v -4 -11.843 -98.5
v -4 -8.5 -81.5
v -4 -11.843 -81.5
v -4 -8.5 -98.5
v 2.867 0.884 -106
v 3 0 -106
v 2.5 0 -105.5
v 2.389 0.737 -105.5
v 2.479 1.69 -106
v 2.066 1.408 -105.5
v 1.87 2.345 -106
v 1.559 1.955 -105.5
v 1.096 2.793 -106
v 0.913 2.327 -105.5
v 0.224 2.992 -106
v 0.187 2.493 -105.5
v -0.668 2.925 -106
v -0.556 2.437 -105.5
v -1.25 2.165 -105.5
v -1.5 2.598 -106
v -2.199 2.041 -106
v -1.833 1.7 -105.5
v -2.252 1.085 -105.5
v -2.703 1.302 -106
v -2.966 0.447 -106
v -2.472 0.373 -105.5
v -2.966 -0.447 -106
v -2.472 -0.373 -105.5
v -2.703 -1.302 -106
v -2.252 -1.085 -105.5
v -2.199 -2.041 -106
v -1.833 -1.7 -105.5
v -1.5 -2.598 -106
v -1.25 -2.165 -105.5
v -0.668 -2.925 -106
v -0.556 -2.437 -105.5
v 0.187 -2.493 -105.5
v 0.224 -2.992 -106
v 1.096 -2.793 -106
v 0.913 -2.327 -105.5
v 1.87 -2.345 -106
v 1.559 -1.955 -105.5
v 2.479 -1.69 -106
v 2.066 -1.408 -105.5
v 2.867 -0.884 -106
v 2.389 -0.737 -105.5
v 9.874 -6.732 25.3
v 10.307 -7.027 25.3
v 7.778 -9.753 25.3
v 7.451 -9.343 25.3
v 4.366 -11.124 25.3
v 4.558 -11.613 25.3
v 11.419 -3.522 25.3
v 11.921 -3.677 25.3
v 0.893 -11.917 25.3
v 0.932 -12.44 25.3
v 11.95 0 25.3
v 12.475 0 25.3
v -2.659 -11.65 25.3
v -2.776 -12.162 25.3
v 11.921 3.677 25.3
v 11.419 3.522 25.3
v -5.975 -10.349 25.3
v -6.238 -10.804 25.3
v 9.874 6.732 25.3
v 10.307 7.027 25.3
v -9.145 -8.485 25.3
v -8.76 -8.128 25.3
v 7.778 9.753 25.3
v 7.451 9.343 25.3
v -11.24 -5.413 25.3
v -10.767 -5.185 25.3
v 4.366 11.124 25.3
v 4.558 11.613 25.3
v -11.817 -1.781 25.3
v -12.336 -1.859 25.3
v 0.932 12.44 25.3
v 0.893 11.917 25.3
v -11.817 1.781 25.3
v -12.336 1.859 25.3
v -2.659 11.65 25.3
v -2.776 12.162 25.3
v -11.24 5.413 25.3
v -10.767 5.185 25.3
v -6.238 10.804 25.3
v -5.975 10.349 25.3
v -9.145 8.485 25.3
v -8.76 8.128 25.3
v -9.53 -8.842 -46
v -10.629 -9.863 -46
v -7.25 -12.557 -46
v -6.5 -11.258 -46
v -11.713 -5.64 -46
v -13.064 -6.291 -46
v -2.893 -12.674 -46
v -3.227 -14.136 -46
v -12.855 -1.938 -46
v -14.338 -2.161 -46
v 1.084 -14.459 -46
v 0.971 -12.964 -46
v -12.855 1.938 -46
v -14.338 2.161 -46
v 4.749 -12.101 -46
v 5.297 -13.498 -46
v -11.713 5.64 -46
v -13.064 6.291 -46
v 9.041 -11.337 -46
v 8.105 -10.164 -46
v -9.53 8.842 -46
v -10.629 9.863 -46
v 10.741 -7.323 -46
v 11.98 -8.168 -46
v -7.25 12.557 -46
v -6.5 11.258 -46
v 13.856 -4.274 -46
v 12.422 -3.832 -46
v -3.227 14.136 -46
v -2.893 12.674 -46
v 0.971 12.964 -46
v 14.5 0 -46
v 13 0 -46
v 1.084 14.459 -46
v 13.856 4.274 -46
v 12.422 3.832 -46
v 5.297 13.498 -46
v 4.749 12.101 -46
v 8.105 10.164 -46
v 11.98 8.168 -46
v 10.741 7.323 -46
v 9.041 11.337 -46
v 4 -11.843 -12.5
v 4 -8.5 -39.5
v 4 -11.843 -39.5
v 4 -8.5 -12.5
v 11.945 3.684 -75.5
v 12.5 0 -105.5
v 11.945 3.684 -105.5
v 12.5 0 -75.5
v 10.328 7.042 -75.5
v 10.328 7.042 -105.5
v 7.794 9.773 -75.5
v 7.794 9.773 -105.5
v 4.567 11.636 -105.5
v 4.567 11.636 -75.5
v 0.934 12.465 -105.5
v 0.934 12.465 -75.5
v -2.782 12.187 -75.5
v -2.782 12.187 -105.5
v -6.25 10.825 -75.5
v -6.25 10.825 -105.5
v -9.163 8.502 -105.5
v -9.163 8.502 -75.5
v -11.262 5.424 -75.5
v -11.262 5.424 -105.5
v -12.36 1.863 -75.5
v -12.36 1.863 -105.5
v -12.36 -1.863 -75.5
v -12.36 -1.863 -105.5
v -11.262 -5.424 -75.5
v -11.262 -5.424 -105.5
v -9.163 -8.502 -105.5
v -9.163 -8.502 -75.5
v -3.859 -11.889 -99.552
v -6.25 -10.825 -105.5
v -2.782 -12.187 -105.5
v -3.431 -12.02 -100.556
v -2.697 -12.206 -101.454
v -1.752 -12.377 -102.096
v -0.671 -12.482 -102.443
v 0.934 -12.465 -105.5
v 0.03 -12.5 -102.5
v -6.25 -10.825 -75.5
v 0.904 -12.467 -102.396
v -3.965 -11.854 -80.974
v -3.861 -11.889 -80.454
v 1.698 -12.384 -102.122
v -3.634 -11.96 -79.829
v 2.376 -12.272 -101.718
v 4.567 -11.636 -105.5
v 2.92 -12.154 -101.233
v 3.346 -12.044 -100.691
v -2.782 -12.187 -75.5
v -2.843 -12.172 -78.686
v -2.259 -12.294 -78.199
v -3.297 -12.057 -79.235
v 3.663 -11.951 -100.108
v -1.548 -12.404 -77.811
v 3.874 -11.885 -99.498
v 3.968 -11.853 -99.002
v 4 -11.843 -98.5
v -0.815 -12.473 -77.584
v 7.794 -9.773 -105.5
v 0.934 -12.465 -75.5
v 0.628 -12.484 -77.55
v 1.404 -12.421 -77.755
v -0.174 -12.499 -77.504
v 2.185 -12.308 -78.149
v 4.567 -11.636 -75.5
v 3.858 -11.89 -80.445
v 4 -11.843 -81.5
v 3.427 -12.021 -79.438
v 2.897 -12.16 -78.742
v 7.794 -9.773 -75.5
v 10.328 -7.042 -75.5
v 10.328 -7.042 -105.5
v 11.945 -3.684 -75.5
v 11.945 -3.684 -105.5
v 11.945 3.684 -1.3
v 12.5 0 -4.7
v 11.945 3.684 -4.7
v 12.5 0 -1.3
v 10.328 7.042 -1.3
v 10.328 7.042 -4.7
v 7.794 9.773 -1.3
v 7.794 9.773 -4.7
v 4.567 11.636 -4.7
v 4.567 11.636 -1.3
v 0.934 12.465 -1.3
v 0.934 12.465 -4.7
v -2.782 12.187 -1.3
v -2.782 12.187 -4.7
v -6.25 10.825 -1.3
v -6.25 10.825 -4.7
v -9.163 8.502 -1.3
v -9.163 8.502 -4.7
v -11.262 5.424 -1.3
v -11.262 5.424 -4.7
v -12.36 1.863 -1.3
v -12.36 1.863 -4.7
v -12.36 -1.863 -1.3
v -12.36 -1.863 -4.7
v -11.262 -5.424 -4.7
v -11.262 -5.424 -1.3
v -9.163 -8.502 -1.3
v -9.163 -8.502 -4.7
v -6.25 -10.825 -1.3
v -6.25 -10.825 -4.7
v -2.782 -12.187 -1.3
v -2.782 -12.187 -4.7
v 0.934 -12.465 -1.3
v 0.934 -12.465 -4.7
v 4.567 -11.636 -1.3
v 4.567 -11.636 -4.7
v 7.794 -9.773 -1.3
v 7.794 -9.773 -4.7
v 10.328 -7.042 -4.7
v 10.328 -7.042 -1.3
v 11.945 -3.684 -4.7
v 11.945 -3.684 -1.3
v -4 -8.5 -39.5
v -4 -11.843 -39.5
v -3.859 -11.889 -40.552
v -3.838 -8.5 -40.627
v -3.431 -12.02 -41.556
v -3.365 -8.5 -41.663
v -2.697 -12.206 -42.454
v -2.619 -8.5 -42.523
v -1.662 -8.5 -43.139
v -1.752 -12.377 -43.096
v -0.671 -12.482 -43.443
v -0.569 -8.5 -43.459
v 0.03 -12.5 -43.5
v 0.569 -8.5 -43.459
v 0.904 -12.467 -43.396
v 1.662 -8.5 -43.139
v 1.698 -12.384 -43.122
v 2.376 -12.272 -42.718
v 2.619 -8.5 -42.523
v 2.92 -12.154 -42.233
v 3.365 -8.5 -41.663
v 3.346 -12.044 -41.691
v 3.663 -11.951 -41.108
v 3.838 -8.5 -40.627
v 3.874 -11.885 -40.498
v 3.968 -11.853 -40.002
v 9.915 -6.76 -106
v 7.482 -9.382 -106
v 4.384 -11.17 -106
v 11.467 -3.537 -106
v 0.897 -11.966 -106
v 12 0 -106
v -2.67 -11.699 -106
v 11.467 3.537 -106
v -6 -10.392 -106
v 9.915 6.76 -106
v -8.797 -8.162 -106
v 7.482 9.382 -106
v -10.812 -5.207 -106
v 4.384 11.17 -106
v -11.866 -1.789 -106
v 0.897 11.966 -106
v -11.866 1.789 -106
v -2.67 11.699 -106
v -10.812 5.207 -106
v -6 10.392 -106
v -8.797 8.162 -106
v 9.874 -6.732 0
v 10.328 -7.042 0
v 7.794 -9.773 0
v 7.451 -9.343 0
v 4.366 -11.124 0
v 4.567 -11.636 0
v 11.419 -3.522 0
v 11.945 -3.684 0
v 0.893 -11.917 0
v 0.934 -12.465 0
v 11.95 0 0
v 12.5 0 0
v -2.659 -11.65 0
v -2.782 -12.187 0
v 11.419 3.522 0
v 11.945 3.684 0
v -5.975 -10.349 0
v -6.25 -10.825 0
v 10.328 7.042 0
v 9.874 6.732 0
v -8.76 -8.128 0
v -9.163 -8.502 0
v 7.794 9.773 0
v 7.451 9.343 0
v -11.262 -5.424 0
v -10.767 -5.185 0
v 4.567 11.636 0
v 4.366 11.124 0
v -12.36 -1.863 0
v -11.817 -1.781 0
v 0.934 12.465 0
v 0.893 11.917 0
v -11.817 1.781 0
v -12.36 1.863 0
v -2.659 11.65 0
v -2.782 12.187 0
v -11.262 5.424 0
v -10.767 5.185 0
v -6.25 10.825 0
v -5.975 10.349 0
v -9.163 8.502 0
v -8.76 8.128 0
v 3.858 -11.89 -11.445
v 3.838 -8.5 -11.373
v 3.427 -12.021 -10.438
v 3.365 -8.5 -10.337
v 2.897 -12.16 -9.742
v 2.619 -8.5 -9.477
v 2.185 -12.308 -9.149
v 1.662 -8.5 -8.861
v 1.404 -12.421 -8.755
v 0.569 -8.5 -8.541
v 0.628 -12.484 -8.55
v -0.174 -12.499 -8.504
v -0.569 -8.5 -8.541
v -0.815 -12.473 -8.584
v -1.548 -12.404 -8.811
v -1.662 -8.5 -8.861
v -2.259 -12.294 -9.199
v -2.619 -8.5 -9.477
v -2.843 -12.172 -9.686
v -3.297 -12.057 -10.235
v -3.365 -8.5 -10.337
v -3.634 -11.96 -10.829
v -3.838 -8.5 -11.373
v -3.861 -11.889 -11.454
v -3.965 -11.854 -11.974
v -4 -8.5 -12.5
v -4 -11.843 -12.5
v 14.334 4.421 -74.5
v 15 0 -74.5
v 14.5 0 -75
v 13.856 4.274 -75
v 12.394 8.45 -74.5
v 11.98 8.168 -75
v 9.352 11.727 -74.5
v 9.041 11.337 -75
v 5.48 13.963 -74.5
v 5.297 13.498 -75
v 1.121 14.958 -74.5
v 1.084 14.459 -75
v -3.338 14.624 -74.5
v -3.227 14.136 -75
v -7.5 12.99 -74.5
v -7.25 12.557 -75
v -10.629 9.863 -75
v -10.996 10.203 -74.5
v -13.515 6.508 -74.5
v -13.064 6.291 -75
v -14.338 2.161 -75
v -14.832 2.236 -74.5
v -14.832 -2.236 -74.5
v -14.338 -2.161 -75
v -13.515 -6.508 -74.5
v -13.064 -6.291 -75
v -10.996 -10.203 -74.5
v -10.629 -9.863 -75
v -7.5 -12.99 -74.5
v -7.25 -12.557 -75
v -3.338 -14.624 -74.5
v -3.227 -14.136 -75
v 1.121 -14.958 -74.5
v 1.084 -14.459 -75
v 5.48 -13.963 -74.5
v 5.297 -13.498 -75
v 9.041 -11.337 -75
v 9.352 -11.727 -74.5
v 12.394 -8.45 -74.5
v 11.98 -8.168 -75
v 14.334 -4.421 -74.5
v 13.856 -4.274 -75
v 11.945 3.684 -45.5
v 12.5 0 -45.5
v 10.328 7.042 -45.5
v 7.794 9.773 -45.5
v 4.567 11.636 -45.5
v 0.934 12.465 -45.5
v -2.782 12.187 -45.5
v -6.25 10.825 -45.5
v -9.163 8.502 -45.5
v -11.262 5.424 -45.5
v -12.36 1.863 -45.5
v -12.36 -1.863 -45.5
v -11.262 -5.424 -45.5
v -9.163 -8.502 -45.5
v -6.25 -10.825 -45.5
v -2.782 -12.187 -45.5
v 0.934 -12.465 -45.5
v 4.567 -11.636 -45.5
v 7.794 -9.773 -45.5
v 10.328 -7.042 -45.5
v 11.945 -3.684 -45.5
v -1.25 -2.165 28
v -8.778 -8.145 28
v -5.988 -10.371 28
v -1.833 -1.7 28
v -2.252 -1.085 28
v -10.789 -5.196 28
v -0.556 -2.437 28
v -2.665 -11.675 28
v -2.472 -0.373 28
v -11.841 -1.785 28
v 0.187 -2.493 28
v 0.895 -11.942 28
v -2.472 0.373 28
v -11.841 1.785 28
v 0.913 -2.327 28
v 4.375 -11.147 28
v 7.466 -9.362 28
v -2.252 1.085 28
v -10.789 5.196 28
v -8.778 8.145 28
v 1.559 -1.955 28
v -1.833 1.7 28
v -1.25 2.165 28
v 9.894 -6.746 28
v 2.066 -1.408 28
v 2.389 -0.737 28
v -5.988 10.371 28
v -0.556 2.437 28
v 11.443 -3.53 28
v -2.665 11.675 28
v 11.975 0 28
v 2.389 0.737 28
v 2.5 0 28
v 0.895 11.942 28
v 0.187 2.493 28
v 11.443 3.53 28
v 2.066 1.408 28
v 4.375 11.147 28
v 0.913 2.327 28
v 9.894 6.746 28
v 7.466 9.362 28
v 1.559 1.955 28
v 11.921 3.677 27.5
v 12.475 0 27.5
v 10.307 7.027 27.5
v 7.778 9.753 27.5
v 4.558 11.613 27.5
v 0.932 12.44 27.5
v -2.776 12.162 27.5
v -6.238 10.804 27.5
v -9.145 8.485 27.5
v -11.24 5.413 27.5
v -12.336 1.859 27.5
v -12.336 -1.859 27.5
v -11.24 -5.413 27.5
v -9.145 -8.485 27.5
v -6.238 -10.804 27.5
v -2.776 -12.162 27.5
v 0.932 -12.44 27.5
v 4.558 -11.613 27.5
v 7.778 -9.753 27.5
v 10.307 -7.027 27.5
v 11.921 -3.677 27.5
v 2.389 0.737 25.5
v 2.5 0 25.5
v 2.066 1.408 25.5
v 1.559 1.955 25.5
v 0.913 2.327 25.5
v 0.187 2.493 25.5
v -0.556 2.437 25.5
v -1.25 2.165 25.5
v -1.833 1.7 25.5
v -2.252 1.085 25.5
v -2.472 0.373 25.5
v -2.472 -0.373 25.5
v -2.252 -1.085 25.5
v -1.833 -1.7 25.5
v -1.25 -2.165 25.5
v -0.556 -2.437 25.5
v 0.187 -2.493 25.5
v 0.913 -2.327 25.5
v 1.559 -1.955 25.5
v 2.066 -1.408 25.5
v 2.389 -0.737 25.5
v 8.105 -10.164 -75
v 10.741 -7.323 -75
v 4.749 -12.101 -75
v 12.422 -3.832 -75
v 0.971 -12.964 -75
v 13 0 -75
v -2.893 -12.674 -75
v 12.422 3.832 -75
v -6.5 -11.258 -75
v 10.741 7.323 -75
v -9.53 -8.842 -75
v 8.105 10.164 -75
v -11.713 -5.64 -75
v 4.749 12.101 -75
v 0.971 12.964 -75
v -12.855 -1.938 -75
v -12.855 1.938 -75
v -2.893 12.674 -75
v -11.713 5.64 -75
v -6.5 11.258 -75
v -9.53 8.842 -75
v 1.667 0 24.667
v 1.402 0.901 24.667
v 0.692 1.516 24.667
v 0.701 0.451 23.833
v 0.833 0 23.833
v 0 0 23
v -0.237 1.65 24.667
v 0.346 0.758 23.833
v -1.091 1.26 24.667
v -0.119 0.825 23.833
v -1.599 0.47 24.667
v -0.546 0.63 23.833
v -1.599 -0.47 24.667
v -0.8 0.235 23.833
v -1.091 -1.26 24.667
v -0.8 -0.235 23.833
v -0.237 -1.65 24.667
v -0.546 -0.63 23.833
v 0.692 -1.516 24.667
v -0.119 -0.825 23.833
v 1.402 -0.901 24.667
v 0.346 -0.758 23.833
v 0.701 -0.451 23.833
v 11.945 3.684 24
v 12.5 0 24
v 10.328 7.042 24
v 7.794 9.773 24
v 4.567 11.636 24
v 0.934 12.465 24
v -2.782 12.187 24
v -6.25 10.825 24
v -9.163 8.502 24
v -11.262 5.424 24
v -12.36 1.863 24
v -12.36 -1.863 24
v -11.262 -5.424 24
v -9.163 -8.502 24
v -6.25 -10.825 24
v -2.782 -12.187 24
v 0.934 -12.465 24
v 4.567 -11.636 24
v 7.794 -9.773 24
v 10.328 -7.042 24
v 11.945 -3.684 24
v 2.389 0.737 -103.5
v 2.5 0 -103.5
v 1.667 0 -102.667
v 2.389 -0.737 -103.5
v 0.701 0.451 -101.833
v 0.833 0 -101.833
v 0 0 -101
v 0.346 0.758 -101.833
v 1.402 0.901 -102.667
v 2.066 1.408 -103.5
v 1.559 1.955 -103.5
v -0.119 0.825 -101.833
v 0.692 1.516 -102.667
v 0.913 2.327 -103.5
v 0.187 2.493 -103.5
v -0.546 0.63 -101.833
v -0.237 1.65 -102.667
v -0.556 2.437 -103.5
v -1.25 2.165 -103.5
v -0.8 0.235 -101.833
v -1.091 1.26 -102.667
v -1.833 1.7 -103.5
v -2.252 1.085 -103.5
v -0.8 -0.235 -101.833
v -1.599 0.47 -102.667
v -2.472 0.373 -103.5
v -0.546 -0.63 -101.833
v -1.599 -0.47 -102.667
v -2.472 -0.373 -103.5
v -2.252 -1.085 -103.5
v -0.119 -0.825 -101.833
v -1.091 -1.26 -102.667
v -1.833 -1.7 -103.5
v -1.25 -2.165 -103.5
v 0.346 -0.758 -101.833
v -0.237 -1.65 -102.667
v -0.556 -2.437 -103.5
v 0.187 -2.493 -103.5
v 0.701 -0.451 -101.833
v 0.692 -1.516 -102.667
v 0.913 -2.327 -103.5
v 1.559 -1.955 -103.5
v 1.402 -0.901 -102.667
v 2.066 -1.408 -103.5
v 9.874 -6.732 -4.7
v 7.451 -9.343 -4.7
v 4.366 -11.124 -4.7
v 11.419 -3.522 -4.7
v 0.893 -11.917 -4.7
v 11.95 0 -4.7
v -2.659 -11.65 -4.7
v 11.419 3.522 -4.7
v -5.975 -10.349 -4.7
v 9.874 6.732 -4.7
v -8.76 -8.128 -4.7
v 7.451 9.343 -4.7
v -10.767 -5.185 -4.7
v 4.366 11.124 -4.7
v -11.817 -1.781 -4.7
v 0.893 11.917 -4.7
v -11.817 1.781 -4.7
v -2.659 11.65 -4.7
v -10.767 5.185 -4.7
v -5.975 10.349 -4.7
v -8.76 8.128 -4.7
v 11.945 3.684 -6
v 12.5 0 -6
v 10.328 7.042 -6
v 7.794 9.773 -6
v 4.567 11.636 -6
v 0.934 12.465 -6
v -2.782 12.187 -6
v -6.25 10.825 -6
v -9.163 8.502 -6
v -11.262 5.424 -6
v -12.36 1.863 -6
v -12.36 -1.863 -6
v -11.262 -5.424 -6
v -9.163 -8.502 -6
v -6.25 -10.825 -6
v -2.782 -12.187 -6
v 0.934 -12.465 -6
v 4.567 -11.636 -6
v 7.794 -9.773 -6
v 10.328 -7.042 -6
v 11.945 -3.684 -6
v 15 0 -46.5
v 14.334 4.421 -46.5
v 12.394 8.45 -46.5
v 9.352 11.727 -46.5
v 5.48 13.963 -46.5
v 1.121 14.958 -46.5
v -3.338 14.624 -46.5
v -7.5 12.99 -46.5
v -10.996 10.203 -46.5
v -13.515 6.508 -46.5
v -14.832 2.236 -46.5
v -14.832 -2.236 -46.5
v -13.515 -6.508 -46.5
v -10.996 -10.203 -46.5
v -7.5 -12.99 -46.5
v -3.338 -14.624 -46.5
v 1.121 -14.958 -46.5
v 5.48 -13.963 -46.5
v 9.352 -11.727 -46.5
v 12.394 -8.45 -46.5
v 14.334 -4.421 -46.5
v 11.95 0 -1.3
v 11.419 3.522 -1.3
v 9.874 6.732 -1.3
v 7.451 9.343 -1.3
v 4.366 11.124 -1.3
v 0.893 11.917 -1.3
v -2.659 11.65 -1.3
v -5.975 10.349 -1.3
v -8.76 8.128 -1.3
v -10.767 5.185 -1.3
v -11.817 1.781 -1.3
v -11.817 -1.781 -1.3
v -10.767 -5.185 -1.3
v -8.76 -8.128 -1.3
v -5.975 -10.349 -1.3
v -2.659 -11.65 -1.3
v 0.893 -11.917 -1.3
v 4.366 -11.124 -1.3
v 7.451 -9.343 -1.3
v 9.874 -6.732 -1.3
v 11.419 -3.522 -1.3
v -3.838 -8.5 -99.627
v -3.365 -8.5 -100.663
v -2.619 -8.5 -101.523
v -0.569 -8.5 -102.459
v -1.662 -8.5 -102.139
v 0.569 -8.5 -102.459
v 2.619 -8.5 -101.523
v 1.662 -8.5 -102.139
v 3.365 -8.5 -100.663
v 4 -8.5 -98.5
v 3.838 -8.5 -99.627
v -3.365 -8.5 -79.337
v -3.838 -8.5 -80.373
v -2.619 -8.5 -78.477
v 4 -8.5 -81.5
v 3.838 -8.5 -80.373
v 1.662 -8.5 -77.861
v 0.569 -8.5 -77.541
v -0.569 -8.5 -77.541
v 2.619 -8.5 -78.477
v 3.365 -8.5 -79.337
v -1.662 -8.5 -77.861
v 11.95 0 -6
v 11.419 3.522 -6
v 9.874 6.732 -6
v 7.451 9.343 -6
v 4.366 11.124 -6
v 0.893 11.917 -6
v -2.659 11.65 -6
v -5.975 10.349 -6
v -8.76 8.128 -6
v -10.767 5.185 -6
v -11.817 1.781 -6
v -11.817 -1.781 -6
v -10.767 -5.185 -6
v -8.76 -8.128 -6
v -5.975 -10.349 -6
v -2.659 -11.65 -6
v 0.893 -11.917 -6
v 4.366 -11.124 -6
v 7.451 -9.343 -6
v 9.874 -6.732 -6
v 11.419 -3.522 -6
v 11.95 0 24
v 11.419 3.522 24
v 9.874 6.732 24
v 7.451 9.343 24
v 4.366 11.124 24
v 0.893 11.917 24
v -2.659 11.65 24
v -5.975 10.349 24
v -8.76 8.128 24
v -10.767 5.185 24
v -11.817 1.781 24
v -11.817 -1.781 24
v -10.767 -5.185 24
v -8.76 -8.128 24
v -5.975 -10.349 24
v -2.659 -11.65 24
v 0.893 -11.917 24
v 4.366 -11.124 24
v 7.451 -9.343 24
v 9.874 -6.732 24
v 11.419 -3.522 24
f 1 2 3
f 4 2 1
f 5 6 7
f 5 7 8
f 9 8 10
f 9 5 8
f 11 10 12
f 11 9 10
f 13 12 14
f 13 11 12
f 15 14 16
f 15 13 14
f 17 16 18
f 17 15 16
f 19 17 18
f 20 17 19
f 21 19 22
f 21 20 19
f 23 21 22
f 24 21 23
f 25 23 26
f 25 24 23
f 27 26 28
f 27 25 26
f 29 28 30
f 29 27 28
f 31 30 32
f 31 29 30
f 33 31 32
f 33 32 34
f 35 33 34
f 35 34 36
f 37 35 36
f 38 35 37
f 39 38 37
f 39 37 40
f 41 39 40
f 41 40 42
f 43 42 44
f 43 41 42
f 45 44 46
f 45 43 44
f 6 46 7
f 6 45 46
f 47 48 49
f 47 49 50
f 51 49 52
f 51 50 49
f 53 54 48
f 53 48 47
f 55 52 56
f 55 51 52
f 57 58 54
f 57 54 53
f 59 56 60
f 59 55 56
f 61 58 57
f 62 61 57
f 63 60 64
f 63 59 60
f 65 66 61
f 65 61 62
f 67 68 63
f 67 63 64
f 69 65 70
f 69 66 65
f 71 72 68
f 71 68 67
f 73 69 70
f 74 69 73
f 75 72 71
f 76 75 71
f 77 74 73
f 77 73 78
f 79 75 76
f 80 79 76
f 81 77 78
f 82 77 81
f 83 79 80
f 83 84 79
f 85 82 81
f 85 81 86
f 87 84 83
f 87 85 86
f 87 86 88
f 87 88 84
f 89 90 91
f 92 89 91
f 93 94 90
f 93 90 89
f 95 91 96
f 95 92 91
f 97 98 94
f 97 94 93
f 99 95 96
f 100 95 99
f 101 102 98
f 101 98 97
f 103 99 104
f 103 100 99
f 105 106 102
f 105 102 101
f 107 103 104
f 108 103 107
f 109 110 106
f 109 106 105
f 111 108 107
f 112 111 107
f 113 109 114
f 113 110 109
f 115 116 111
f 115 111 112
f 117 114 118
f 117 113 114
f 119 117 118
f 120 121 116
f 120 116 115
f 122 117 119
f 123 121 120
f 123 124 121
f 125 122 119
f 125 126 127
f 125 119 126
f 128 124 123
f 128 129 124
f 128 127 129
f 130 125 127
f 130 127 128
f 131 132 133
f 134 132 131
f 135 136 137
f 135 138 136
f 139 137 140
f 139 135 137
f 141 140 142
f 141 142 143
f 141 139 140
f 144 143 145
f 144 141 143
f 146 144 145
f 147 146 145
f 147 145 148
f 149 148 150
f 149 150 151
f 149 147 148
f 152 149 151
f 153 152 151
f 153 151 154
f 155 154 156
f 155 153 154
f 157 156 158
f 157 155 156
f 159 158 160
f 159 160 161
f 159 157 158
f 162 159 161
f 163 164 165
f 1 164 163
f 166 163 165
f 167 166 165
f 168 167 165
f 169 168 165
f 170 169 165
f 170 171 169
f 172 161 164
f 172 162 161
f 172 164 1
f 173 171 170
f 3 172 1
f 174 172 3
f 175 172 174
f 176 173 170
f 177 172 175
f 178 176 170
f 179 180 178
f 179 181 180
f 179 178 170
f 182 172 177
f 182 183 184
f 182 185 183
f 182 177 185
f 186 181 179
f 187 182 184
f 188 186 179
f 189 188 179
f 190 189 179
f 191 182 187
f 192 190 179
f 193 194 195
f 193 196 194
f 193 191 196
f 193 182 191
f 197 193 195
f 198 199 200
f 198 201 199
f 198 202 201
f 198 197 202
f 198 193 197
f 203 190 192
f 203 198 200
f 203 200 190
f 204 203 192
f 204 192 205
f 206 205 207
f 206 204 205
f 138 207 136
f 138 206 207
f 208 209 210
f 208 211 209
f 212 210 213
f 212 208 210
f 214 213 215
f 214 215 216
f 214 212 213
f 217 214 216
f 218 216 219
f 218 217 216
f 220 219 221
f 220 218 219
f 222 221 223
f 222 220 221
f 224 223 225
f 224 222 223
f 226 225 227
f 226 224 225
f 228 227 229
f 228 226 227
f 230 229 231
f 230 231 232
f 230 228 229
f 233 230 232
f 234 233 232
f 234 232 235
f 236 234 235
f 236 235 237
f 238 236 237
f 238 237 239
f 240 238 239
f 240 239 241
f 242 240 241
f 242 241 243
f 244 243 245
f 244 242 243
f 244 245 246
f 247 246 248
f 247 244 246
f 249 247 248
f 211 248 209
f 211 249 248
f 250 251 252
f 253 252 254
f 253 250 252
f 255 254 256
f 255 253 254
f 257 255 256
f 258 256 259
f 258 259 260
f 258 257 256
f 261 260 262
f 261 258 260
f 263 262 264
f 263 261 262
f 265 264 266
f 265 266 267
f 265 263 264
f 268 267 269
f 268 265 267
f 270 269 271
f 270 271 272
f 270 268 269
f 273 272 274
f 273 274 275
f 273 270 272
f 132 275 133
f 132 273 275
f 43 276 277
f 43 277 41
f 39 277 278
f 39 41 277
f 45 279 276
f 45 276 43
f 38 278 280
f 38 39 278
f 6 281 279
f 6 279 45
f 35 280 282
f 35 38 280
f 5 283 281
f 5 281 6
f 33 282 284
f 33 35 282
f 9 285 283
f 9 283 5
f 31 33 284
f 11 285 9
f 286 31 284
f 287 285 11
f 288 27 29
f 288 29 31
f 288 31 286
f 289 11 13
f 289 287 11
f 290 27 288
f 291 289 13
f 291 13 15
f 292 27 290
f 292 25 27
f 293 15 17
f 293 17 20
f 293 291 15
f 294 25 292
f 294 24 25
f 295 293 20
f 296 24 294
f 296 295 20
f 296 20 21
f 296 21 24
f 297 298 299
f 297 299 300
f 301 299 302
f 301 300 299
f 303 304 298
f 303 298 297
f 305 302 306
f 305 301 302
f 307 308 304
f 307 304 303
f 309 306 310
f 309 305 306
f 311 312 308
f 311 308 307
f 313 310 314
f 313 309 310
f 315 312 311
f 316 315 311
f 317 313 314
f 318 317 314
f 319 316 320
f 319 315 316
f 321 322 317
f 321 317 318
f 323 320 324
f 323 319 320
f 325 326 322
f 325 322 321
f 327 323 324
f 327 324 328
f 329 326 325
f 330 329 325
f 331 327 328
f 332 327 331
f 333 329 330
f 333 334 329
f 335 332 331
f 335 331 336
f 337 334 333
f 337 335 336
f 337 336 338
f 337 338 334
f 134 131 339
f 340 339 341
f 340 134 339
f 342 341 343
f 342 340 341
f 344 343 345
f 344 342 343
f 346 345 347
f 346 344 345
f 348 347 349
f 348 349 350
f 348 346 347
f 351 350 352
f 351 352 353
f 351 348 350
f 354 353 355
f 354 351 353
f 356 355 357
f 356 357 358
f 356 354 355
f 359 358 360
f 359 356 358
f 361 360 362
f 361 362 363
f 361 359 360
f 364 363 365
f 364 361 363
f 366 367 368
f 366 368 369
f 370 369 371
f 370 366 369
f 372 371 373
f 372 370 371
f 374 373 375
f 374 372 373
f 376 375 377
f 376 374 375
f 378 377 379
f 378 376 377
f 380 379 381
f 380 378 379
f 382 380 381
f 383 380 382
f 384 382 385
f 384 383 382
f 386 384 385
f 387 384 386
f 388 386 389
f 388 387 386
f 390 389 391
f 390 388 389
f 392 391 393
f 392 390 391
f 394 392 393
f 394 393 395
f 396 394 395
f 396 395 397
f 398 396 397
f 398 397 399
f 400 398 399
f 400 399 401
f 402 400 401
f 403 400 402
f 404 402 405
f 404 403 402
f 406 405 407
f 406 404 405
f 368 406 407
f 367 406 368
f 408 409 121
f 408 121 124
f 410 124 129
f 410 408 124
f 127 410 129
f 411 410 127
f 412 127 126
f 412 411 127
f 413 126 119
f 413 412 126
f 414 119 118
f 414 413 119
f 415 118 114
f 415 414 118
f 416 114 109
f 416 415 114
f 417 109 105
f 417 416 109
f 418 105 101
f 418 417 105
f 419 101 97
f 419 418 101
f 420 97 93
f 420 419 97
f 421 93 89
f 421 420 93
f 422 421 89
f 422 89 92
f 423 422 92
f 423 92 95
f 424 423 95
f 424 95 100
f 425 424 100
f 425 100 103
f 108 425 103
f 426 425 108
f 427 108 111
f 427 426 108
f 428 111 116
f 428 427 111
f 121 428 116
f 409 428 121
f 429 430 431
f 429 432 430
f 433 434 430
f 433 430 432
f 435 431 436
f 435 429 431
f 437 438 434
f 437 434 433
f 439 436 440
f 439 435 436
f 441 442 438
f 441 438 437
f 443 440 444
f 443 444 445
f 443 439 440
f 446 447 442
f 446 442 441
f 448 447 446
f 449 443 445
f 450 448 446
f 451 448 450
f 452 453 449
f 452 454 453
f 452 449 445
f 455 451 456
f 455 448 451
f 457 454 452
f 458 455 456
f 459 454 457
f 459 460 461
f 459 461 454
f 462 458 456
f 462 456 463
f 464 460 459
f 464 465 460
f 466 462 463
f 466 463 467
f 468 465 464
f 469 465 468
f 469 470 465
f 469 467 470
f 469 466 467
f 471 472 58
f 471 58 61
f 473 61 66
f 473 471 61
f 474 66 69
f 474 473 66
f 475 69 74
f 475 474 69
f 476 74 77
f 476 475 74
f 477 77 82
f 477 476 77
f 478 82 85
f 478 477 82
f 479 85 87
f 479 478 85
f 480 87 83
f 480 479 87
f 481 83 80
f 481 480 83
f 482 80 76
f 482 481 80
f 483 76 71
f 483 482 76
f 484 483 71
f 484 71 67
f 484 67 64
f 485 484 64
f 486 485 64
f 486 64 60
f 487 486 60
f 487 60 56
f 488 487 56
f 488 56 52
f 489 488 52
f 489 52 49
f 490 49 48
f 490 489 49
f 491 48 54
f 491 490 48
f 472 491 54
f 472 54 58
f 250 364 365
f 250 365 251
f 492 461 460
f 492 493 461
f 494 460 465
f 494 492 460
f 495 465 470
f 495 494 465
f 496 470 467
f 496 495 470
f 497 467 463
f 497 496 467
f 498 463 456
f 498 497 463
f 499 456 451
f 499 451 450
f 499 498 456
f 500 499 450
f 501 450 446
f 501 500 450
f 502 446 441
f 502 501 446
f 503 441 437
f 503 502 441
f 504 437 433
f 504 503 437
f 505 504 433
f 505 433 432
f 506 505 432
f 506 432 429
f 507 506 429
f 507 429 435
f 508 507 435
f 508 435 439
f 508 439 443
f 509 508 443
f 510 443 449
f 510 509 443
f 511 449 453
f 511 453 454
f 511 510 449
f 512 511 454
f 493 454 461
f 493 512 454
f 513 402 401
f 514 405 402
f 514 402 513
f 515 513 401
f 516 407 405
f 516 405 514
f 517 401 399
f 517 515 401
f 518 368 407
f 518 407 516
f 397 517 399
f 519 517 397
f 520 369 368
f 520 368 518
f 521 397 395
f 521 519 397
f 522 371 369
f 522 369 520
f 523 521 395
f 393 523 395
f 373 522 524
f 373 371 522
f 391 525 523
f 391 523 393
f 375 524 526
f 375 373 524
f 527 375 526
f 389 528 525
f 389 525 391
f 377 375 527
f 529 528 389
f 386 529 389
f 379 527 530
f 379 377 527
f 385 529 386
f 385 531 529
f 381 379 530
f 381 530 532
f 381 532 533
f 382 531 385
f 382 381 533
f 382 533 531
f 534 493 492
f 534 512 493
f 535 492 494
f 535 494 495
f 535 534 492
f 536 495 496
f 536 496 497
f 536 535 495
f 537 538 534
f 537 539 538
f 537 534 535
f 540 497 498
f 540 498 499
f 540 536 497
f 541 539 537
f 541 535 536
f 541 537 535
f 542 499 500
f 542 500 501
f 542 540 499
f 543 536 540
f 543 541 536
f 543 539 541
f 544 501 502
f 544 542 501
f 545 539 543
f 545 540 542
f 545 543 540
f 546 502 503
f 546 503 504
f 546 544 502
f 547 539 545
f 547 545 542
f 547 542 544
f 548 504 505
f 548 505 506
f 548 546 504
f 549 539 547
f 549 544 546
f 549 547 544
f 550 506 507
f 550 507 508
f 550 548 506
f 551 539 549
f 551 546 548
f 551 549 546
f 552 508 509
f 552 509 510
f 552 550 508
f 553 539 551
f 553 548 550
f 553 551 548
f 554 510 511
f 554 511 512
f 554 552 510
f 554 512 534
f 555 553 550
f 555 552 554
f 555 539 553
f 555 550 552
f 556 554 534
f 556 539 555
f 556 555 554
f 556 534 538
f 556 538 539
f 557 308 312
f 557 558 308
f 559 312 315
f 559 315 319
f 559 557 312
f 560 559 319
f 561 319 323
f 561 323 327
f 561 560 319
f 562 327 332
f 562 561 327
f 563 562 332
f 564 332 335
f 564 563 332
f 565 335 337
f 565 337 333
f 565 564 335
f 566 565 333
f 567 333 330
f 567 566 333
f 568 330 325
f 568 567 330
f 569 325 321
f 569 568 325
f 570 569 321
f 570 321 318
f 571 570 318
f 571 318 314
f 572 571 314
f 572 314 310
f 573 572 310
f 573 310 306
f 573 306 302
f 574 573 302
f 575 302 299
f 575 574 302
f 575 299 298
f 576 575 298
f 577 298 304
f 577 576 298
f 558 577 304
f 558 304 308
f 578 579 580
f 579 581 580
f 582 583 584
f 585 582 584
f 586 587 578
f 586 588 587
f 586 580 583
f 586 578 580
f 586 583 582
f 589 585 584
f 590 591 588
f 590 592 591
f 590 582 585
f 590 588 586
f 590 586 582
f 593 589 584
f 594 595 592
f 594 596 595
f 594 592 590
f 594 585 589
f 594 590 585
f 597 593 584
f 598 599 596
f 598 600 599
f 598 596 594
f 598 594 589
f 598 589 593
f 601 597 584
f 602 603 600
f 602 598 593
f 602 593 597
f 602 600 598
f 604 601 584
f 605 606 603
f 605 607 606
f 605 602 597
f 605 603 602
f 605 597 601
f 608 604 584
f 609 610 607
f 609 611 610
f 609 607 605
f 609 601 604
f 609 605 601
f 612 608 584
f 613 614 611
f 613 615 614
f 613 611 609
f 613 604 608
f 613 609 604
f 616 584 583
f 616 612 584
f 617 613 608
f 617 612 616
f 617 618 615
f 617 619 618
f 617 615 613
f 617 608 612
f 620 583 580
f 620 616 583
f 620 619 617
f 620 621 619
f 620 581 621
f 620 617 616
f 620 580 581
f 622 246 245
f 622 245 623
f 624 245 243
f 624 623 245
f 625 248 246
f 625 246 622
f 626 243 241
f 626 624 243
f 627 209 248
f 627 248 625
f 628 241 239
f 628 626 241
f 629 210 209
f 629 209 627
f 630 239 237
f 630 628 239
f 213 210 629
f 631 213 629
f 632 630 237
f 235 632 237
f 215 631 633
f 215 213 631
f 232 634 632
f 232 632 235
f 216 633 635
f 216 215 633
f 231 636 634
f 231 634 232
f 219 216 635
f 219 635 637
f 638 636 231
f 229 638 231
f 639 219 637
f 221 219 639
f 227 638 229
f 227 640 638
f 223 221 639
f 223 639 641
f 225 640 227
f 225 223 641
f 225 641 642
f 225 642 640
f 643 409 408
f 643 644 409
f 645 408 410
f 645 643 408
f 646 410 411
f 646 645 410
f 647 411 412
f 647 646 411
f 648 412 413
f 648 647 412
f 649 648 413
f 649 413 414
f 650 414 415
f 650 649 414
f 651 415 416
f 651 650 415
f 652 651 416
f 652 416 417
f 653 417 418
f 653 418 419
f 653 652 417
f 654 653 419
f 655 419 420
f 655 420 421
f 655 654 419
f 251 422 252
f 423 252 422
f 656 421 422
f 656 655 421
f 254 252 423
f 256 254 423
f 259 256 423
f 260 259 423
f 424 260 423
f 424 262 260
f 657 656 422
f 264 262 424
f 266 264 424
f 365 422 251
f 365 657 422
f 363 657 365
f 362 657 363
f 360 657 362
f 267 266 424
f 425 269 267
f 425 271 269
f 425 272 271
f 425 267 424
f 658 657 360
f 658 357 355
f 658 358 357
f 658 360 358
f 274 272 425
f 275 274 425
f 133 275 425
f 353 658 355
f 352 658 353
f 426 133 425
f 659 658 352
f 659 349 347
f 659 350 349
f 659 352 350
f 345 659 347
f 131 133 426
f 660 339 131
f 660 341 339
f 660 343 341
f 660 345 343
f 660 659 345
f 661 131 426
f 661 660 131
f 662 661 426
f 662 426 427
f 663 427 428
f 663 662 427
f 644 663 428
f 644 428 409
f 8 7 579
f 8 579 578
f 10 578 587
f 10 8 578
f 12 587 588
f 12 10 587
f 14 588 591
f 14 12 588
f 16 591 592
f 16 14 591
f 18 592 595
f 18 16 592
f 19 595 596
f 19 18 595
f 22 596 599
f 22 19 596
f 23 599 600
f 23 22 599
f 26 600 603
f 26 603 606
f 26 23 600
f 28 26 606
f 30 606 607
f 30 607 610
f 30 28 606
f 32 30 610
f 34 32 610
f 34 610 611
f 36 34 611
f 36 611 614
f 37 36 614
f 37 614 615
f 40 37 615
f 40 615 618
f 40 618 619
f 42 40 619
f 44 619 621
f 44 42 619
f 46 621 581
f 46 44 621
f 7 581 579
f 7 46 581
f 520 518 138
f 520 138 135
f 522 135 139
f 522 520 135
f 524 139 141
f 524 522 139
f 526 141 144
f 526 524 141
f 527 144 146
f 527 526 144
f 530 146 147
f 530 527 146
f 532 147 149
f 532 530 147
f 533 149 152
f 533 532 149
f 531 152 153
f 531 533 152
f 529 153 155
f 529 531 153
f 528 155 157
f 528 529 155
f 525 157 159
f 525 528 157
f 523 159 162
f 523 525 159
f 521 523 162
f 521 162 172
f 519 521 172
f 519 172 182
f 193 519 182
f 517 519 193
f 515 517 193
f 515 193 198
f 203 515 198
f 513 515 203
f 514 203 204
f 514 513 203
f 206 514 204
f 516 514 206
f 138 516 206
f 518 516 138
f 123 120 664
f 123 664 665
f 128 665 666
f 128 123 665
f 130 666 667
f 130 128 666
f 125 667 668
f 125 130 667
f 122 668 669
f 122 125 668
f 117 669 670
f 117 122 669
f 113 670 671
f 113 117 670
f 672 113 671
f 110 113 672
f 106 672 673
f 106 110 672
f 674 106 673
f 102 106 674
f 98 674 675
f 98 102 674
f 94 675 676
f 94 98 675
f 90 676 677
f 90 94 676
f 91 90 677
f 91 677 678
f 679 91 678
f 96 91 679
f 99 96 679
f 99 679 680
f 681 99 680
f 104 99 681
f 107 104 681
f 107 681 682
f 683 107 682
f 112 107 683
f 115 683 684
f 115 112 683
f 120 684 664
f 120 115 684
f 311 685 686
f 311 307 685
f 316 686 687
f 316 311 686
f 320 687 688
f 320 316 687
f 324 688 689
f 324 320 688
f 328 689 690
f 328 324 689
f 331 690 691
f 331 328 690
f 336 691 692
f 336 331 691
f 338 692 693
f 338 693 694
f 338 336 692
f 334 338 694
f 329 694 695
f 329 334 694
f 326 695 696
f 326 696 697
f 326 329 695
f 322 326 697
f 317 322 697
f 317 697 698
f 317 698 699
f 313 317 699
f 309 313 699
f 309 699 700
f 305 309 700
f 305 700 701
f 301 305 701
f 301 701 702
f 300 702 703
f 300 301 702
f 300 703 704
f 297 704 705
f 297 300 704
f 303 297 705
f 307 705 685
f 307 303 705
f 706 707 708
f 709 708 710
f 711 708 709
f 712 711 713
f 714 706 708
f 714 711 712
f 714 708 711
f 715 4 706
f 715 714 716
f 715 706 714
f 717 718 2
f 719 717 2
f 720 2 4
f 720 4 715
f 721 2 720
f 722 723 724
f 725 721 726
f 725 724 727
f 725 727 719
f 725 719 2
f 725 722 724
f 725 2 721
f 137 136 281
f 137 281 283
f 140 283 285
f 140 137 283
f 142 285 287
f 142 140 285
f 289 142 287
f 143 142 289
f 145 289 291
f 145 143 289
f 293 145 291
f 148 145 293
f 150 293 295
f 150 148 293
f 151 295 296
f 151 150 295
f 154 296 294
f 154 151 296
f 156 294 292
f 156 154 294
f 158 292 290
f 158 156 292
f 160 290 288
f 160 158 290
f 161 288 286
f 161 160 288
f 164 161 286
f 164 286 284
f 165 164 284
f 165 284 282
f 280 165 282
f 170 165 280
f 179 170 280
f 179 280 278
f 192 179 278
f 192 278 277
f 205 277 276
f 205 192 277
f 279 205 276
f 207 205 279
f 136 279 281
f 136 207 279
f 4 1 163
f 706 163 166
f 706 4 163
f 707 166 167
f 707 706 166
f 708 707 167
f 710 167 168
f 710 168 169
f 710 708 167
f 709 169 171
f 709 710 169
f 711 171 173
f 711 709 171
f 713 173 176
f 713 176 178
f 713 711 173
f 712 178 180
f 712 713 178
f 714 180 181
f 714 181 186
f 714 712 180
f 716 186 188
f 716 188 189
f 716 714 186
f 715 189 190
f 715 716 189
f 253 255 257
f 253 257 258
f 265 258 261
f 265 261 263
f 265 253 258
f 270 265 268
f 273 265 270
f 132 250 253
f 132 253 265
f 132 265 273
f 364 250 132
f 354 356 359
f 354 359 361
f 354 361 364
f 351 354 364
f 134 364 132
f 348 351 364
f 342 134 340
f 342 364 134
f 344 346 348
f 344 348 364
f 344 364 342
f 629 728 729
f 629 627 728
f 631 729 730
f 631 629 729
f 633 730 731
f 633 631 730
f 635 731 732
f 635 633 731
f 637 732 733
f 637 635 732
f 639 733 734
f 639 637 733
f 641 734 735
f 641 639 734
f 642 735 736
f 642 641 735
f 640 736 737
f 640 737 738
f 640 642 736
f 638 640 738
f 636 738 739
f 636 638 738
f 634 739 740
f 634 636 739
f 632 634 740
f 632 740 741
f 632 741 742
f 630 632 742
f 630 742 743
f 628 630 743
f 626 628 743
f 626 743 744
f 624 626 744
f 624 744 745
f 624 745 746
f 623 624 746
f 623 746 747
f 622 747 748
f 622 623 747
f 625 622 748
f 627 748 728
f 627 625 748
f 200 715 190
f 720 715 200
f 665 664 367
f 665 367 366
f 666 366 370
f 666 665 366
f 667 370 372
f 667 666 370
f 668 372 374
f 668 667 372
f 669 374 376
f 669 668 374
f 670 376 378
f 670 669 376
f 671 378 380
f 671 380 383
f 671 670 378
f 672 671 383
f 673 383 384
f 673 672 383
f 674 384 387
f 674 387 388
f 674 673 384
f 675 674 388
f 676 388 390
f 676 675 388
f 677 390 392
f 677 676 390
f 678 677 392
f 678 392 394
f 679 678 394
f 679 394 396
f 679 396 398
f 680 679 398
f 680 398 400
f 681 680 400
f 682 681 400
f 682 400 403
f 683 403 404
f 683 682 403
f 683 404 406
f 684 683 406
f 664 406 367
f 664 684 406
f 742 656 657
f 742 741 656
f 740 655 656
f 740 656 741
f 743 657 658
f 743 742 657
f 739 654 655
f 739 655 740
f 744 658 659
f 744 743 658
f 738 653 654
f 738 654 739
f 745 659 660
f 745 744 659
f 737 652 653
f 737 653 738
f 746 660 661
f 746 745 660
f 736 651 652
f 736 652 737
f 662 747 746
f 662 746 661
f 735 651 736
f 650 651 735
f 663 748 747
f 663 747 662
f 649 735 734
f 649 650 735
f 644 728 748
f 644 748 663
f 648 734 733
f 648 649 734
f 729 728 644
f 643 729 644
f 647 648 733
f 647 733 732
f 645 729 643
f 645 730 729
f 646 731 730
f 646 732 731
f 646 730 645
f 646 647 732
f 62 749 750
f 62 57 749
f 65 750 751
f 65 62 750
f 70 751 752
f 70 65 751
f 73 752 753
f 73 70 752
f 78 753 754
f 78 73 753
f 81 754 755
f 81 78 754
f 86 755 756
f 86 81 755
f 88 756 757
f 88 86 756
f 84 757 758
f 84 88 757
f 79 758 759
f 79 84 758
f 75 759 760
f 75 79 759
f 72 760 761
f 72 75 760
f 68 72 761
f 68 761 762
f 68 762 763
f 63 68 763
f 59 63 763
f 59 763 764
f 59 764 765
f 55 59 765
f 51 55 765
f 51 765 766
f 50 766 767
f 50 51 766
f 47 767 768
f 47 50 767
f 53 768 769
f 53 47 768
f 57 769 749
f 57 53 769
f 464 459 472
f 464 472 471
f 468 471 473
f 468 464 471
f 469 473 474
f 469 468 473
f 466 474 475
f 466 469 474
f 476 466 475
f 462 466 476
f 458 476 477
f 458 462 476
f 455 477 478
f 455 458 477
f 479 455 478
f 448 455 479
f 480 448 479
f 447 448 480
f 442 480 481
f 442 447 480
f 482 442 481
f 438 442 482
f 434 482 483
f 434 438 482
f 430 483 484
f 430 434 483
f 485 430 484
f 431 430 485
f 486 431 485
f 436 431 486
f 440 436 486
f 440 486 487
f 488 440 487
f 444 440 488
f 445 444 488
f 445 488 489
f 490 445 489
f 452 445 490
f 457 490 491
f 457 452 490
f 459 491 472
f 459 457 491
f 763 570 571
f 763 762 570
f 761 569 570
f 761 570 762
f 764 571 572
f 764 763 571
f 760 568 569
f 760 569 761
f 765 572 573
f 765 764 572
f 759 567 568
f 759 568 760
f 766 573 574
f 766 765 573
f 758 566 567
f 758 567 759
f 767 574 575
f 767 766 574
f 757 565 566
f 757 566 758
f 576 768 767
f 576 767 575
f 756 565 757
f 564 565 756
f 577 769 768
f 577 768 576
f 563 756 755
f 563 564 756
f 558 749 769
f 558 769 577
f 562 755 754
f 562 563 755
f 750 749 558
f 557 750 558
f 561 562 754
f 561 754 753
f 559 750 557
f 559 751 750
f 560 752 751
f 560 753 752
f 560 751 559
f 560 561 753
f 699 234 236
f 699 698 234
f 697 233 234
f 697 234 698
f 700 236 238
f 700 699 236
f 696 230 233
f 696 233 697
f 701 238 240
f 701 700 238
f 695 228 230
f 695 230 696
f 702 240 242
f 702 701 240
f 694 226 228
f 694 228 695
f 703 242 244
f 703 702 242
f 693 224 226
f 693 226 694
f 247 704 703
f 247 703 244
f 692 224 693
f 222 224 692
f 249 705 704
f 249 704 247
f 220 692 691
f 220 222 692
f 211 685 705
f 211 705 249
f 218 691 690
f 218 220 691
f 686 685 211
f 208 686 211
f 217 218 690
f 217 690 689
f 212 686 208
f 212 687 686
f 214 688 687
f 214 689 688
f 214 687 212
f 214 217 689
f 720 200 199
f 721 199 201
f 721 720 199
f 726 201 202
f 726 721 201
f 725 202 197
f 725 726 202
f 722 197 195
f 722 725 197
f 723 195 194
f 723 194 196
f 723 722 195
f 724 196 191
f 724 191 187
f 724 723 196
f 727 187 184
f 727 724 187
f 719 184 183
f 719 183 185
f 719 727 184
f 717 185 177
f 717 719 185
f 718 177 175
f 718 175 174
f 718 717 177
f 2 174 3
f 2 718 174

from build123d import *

# Parameters (mm, degrees)
F2_SIZE  = 0.5
F5_DEPTH = 25


with BuildPart() as f1:
    # F0 (on Front) → F1 (revolve)
    with BuildSketch(Plane.XZ):
        Polygon((0, 23), (0, 0), (0, -101), (2.5, -103.5), (2.5, -106), (12.5, -106), (12.5, -105), (12.5, -75), (15, -75), (15, -51), (15, -46), (12.5, -46), (12.5, -6), (11.95, -6), (11.95, -4.7), (12.5, -4.7), (12.5, -1.3), (11.95, -1.3), (11.95, 0), (12.5, 0), (12.5, 24), (11.95, 24), (11.95, 25.3), (12.475, 25.3), (12.475, 28), (2.5, 28), (2.5, 25.5), align=None)
    revolve(axis=Axis((0, 0, -50.5), (0, 0, 1)))

    # F2
    f2_edges = [f1.edges().sort_by_distance(p)[0] for p in [
        (-15, 0, -46),
        (-12.5, 0, -46),
        (-12.5, 0, -75),
        (-15, 0, -75),
        (-12.475, 0, 28),
        (-2.5, 0, -106),
        (-12.5, 0, -106),
    ]]
    chamfer(f2_edges, length=F2_SIZE)

    # F4 (on offset) → F5 (cut)
    with BuildSketch(Plane.XZ.offset(8.5)):
        with BuildLine():
            ThreePointArc((-4, -39.5), (0, -43.5), (4, -39.5))
            Line((4, -39.5), (4, -12.5))
            ThreePointArc((4, -12.5), (0, -8.5), (-4, -12.5))
            Line((-4, -12.5), (-4, -39.5))
        make_face()
        with BuildLine():
            Line((4, -98.5), (4, -81.5))
            ThreePointArc((4, -81.5), (0, -77.5), (-4, -81.5))
            Line((-4, -81.5), (-4, -98.5))
            ThreePointArc((-4, -98.5), (0, -102.5), (4, -98.5))
        make_face()
    extrude(amount=F5_DEPTH, mode=Mode.SUBTRACT)


solid = f1.part
